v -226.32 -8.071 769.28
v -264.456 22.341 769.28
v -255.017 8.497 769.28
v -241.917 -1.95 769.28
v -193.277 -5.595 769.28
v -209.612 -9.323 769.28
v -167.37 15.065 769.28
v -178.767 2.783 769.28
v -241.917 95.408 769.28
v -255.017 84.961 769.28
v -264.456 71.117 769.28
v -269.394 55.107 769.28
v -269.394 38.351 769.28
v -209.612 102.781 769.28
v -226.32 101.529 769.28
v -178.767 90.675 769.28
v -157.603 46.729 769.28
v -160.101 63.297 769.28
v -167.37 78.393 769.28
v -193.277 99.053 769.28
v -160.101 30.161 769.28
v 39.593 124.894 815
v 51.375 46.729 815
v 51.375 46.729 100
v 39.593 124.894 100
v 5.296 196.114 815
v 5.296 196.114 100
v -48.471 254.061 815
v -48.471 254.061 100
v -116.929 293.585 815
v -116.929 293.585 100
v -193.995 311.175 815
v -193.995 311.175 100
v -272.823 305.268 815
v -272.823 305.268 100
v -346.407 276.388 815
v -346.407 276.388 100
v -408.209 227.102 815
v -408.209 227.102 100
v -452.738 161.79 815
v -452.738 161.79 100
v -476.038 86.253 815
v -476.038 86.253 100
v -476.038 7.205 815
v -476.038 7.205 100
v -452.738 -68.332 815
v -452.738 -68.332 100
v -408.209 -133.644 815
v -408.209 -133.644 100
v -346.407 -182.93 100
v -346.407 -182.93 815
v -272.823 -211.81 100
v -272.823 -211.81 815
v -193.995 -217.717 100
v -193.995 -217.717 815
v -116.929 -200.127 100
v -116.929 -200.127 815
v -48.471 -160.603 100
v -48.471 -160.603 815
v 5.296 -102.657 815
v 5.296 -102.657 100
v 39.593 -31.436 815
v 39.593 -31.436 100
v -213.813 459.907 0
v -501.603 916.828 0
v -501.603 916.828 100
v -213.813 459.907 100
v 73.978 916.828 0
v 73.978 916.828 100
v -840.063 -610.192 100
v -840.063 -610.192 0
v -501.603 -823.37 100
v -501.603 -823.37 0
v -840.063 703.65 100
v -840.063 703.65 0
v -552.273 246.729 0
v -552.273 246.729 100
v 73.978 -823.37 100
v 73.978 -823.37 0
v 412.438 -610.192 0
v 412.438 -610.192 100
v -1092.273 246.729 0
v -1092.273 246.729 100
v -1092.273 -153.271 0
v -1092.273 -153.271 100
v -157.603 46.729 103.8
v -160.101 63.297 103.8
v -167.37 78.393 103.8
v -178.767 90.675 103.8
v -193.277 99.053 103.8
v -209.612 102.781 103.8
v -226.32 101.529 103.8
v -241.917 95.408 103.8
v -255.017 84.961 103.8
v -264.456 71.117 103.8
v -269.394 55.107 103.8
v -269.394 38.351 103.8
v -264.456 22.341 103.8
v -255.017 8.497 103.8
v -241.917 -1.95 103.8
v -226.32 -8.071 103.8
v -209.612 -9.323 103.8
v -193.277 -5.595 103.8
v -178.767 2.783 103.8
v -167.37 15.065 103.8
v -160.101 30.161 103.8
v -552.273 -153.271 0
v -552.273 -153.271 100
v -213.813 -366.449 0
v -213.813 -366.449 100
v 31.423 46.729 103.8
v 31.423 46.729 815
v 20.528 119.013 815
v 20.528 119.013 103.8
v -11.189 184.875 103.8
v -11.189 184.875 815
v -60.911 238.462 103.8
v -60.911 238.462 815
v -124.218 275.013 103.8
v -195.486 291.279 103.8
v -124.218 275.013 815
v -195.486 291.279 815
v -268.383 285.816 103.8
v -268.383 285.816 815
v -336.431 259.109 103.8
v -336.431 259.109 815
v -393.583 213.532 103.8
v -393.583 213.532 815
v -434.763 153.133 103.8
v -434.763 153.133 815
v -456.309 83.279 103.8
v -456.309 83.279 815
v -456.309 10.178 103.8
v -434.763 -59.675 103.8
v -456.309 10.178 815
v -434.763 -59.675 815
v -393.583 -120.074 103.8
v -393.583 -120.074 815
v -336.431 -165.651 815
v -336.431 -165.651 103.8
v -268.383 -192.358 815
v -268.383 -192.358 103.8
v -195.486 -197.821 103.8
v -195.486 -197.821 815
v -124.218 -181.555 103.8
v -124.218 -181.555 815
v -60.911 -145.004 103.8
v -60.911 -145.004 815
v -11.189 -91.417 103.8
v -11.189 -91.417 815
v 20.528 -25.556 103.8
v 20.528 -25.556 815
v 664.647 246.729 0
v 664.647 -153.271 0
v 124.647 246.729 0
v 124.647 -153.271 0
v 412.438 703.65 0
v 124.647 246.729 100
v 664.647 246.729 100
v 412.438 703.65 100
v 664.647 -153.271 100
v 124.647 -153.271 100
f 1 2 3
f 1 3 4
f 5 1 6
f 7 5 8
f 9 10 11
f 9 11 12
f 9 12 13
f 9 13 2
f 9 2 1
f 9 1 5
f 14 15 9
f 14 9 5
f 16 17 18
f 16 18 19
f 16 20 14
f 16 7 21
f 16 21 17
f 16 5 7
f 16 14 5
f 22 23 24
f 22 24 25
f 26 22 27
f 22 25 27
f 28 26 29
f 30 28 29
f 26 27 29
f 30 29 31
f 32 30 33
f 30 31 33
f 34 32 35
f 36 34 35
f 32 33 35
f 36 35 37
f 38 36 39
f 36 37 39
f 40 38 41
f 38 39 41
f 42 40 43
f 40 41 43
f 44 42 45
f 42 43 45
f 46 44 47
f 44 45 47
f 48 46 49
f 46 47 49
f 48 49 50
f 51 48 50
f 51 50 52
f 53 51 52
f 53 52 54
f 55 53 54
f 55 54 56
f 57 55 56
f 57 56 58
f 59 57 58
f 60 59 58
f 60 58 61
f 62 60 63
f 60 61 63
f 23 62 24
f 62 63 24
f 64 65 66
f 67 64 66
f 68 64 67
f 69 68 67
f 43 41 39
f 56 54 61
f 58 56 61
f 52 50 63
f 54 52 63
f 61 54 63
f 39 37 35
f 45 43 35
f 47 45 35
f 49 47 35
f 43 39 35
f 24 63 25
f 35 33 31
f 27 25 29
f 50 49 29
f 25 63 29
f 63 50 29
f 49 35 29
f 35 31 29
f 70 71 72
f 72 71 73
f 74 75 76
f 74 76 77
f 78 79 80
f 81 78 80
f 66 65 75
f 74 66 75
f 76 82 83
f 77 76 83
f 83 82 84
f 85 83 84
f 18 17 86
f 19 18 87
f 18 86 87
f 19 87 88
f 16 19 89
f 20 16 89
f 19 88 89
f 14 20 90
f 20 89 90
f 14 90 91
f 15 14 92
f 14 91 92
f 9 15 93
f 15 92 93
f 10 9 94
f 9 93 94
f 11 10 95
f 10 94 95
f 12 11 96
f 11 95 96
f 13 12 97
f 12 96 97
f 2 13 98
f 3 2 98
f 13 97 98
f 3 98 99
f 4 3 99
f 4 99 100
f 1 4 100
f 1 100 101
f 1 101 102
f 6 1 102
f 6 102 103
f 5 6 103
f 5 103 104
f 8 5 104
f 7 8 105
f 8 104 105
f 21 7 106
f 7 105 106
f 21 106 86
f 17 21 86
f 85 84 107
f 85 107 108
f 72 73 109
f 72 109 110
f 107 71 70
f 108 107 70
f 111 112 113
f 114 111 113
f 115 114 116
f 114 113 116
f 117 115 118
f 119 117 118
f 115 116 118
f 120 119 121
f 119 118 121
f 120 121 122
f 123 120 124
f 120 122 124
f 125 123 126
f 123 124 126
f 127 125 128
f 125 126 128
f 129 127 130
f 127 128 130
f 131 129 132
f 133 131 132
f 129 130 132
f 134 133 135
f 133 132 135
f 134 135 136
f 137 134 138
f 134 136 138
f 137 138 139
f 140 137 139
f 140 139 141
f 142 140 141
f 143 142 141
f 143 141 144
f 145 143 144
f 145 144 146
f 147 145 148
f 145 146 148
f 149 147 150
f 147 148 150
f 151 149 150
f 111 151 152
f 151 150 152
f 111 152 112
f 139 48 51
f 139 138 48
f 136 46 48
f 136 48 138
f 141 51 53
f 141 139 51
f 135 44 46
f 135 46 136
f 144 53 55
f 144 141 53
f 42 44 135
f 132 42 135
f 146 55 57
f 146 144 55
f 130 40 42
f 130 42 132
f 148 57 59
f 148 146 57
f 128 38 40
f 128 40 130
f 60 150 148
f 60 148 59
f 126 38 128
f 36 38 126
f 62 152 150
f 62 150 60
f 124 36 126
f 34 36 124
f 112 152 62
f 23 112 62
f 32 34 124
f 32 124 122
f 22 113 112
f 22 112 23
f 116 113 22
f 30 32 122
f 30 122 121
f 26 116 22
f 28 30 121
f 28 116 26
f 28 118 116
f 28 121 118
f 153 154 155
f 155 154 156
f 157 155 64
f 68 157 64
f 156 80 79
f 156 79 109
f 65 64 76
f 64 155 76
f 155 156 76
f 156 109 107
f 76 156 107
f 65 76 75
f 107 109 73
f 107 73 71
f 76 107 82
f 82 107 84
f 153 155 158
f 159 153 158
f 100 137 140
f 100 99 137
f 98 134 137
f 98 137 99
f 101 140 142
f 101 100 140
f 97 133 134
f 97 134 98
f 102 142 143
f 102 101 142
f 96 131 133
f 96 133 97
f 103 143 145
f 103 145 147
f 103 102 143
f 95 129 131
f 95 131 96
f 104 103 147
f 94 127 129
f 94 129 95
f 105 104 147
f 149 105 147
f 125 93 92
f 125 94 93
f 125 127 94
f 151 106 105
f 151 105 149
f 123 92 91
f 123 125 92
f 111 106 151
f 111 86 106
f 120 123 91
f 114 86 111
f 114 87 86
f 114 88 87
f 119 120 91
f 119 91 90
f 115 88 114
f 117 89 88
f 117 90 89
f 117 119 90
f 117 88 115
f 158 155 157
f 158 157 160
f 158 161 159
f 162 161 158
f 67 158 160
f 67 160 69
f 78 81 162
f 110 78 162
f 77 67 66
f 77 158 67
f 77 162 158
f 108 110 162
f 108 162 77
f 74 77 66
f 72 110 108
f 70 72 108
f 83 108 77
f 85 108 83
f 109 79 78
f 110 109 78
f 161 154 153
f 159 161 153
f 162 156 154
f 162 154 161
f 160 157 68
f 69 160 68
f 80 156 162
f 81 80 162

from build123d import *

# Parameters (mm, degrees)
F1_DEPTH  = 100
F2_R      = 265.1875934323
F3_DEPTH  = 715
F4_DEPTH  = 540
F5_DEPTH  = 540
F6_DEPTH  = 540
F7_DEPTH  = 540
F8_DEPTH  = 540
F9_DEPTH  = 540
F10_R     = 245.2357651559
F11_DEPTH = 711.2
F12_R     = 56.2093227212
F13_DEPTH = 665.48


with BuildPart() as f1:
    # F0 (on Top) → F1 (new body)
    with BuildSketch(Plane.XY):
        Polygon((124.6471304007, -153.2710264661), (124.6471304007, 246.7289735339), (-213.8127173087, 459.9071419483), (-552.2725650182, 246.7289735339), (-552.2725650182, -153.2710264661), (-213.8127173087, -366.4491948805), align=None)
    extrude(amount=F1_DEPTH)

    # F4 (add): a face of the model
    f4_faces = [f1.faces().sort_by_distance(p)[0] for p in [
        (-44.582793454, -259.8601106733, 50),
    ]]
    extrude(f4_faces, amount=F4_DEPTH)

    # F5 (add): a face of the model
    f5_faces = [f1.faces().sort_by_distance(p)[0] for p in [
        (124.6471304007, 46.7289735339, 50),
    ]]
    extrude(f5_faces, amount=F5_DEPTH)

    # F6 (add): a face of the model
    f6_faces = [f1.faces().sort_by_distance(p)[0] for p in [
        (-383.0426411634, -259.8601106733, 50),
    ]]
    extrude(f6_faces, amount=F6_DEPTH)

    # F7 (add): a face of the model
    f7_faces = [f1.faces().sort_by_distance(p)[0] for p in [
        (-552.2725650182, 46.7289735339, 50),
    ]]
    extrude(f7_faces, amount=F7_DEPTH)

    # F8 (add): a face of the model
    f8_faces = [f1.faces().sort_by_distance(p)[0] for p in [
        (-383.0426411634, 353.3180577411, 50),
    ]]
    extrude(f8_faces, amount=F8_DEPTH)

    # F9 (add): a face of the model
    f9_faces = [f1.faces().sort_by_distance(p)[0] for p in [
        (-44.582793454, 353.3180577411, 50),
    ]]
    extrude(f9_faces, amount=F9_DEPTH)


with BuildPart() as f3:
    # F2 (on face) → F3 (new body)
    with BuildSketch(Plane.XY.offset(100)):
        with Locations((-213.8127173087, 46.7289735339)):
            Circle(F2_R)
    extrude(amount=F3_DEPTH)

    # F10 (on face) → F11 (cut)
    with BuildSketch(Plane.XY.offset(815)):
        with Locations((-213.8127173087, 46.7289735339)):
            Circle(F10_R)
    extrude(amount=-F11_DEPTH, mode=Mode.SUBTRACT)

    # F12 (on face) → F13 (join)
    with BuildSketch(Plane.XY.offset(103.8)):
        with Locations((-213.8127173087, 46.7289735339)):
            Circle(F12_R)
    extrude(amount=F13_DEPTH)


solid = Compound([f1.part, f3.part])
